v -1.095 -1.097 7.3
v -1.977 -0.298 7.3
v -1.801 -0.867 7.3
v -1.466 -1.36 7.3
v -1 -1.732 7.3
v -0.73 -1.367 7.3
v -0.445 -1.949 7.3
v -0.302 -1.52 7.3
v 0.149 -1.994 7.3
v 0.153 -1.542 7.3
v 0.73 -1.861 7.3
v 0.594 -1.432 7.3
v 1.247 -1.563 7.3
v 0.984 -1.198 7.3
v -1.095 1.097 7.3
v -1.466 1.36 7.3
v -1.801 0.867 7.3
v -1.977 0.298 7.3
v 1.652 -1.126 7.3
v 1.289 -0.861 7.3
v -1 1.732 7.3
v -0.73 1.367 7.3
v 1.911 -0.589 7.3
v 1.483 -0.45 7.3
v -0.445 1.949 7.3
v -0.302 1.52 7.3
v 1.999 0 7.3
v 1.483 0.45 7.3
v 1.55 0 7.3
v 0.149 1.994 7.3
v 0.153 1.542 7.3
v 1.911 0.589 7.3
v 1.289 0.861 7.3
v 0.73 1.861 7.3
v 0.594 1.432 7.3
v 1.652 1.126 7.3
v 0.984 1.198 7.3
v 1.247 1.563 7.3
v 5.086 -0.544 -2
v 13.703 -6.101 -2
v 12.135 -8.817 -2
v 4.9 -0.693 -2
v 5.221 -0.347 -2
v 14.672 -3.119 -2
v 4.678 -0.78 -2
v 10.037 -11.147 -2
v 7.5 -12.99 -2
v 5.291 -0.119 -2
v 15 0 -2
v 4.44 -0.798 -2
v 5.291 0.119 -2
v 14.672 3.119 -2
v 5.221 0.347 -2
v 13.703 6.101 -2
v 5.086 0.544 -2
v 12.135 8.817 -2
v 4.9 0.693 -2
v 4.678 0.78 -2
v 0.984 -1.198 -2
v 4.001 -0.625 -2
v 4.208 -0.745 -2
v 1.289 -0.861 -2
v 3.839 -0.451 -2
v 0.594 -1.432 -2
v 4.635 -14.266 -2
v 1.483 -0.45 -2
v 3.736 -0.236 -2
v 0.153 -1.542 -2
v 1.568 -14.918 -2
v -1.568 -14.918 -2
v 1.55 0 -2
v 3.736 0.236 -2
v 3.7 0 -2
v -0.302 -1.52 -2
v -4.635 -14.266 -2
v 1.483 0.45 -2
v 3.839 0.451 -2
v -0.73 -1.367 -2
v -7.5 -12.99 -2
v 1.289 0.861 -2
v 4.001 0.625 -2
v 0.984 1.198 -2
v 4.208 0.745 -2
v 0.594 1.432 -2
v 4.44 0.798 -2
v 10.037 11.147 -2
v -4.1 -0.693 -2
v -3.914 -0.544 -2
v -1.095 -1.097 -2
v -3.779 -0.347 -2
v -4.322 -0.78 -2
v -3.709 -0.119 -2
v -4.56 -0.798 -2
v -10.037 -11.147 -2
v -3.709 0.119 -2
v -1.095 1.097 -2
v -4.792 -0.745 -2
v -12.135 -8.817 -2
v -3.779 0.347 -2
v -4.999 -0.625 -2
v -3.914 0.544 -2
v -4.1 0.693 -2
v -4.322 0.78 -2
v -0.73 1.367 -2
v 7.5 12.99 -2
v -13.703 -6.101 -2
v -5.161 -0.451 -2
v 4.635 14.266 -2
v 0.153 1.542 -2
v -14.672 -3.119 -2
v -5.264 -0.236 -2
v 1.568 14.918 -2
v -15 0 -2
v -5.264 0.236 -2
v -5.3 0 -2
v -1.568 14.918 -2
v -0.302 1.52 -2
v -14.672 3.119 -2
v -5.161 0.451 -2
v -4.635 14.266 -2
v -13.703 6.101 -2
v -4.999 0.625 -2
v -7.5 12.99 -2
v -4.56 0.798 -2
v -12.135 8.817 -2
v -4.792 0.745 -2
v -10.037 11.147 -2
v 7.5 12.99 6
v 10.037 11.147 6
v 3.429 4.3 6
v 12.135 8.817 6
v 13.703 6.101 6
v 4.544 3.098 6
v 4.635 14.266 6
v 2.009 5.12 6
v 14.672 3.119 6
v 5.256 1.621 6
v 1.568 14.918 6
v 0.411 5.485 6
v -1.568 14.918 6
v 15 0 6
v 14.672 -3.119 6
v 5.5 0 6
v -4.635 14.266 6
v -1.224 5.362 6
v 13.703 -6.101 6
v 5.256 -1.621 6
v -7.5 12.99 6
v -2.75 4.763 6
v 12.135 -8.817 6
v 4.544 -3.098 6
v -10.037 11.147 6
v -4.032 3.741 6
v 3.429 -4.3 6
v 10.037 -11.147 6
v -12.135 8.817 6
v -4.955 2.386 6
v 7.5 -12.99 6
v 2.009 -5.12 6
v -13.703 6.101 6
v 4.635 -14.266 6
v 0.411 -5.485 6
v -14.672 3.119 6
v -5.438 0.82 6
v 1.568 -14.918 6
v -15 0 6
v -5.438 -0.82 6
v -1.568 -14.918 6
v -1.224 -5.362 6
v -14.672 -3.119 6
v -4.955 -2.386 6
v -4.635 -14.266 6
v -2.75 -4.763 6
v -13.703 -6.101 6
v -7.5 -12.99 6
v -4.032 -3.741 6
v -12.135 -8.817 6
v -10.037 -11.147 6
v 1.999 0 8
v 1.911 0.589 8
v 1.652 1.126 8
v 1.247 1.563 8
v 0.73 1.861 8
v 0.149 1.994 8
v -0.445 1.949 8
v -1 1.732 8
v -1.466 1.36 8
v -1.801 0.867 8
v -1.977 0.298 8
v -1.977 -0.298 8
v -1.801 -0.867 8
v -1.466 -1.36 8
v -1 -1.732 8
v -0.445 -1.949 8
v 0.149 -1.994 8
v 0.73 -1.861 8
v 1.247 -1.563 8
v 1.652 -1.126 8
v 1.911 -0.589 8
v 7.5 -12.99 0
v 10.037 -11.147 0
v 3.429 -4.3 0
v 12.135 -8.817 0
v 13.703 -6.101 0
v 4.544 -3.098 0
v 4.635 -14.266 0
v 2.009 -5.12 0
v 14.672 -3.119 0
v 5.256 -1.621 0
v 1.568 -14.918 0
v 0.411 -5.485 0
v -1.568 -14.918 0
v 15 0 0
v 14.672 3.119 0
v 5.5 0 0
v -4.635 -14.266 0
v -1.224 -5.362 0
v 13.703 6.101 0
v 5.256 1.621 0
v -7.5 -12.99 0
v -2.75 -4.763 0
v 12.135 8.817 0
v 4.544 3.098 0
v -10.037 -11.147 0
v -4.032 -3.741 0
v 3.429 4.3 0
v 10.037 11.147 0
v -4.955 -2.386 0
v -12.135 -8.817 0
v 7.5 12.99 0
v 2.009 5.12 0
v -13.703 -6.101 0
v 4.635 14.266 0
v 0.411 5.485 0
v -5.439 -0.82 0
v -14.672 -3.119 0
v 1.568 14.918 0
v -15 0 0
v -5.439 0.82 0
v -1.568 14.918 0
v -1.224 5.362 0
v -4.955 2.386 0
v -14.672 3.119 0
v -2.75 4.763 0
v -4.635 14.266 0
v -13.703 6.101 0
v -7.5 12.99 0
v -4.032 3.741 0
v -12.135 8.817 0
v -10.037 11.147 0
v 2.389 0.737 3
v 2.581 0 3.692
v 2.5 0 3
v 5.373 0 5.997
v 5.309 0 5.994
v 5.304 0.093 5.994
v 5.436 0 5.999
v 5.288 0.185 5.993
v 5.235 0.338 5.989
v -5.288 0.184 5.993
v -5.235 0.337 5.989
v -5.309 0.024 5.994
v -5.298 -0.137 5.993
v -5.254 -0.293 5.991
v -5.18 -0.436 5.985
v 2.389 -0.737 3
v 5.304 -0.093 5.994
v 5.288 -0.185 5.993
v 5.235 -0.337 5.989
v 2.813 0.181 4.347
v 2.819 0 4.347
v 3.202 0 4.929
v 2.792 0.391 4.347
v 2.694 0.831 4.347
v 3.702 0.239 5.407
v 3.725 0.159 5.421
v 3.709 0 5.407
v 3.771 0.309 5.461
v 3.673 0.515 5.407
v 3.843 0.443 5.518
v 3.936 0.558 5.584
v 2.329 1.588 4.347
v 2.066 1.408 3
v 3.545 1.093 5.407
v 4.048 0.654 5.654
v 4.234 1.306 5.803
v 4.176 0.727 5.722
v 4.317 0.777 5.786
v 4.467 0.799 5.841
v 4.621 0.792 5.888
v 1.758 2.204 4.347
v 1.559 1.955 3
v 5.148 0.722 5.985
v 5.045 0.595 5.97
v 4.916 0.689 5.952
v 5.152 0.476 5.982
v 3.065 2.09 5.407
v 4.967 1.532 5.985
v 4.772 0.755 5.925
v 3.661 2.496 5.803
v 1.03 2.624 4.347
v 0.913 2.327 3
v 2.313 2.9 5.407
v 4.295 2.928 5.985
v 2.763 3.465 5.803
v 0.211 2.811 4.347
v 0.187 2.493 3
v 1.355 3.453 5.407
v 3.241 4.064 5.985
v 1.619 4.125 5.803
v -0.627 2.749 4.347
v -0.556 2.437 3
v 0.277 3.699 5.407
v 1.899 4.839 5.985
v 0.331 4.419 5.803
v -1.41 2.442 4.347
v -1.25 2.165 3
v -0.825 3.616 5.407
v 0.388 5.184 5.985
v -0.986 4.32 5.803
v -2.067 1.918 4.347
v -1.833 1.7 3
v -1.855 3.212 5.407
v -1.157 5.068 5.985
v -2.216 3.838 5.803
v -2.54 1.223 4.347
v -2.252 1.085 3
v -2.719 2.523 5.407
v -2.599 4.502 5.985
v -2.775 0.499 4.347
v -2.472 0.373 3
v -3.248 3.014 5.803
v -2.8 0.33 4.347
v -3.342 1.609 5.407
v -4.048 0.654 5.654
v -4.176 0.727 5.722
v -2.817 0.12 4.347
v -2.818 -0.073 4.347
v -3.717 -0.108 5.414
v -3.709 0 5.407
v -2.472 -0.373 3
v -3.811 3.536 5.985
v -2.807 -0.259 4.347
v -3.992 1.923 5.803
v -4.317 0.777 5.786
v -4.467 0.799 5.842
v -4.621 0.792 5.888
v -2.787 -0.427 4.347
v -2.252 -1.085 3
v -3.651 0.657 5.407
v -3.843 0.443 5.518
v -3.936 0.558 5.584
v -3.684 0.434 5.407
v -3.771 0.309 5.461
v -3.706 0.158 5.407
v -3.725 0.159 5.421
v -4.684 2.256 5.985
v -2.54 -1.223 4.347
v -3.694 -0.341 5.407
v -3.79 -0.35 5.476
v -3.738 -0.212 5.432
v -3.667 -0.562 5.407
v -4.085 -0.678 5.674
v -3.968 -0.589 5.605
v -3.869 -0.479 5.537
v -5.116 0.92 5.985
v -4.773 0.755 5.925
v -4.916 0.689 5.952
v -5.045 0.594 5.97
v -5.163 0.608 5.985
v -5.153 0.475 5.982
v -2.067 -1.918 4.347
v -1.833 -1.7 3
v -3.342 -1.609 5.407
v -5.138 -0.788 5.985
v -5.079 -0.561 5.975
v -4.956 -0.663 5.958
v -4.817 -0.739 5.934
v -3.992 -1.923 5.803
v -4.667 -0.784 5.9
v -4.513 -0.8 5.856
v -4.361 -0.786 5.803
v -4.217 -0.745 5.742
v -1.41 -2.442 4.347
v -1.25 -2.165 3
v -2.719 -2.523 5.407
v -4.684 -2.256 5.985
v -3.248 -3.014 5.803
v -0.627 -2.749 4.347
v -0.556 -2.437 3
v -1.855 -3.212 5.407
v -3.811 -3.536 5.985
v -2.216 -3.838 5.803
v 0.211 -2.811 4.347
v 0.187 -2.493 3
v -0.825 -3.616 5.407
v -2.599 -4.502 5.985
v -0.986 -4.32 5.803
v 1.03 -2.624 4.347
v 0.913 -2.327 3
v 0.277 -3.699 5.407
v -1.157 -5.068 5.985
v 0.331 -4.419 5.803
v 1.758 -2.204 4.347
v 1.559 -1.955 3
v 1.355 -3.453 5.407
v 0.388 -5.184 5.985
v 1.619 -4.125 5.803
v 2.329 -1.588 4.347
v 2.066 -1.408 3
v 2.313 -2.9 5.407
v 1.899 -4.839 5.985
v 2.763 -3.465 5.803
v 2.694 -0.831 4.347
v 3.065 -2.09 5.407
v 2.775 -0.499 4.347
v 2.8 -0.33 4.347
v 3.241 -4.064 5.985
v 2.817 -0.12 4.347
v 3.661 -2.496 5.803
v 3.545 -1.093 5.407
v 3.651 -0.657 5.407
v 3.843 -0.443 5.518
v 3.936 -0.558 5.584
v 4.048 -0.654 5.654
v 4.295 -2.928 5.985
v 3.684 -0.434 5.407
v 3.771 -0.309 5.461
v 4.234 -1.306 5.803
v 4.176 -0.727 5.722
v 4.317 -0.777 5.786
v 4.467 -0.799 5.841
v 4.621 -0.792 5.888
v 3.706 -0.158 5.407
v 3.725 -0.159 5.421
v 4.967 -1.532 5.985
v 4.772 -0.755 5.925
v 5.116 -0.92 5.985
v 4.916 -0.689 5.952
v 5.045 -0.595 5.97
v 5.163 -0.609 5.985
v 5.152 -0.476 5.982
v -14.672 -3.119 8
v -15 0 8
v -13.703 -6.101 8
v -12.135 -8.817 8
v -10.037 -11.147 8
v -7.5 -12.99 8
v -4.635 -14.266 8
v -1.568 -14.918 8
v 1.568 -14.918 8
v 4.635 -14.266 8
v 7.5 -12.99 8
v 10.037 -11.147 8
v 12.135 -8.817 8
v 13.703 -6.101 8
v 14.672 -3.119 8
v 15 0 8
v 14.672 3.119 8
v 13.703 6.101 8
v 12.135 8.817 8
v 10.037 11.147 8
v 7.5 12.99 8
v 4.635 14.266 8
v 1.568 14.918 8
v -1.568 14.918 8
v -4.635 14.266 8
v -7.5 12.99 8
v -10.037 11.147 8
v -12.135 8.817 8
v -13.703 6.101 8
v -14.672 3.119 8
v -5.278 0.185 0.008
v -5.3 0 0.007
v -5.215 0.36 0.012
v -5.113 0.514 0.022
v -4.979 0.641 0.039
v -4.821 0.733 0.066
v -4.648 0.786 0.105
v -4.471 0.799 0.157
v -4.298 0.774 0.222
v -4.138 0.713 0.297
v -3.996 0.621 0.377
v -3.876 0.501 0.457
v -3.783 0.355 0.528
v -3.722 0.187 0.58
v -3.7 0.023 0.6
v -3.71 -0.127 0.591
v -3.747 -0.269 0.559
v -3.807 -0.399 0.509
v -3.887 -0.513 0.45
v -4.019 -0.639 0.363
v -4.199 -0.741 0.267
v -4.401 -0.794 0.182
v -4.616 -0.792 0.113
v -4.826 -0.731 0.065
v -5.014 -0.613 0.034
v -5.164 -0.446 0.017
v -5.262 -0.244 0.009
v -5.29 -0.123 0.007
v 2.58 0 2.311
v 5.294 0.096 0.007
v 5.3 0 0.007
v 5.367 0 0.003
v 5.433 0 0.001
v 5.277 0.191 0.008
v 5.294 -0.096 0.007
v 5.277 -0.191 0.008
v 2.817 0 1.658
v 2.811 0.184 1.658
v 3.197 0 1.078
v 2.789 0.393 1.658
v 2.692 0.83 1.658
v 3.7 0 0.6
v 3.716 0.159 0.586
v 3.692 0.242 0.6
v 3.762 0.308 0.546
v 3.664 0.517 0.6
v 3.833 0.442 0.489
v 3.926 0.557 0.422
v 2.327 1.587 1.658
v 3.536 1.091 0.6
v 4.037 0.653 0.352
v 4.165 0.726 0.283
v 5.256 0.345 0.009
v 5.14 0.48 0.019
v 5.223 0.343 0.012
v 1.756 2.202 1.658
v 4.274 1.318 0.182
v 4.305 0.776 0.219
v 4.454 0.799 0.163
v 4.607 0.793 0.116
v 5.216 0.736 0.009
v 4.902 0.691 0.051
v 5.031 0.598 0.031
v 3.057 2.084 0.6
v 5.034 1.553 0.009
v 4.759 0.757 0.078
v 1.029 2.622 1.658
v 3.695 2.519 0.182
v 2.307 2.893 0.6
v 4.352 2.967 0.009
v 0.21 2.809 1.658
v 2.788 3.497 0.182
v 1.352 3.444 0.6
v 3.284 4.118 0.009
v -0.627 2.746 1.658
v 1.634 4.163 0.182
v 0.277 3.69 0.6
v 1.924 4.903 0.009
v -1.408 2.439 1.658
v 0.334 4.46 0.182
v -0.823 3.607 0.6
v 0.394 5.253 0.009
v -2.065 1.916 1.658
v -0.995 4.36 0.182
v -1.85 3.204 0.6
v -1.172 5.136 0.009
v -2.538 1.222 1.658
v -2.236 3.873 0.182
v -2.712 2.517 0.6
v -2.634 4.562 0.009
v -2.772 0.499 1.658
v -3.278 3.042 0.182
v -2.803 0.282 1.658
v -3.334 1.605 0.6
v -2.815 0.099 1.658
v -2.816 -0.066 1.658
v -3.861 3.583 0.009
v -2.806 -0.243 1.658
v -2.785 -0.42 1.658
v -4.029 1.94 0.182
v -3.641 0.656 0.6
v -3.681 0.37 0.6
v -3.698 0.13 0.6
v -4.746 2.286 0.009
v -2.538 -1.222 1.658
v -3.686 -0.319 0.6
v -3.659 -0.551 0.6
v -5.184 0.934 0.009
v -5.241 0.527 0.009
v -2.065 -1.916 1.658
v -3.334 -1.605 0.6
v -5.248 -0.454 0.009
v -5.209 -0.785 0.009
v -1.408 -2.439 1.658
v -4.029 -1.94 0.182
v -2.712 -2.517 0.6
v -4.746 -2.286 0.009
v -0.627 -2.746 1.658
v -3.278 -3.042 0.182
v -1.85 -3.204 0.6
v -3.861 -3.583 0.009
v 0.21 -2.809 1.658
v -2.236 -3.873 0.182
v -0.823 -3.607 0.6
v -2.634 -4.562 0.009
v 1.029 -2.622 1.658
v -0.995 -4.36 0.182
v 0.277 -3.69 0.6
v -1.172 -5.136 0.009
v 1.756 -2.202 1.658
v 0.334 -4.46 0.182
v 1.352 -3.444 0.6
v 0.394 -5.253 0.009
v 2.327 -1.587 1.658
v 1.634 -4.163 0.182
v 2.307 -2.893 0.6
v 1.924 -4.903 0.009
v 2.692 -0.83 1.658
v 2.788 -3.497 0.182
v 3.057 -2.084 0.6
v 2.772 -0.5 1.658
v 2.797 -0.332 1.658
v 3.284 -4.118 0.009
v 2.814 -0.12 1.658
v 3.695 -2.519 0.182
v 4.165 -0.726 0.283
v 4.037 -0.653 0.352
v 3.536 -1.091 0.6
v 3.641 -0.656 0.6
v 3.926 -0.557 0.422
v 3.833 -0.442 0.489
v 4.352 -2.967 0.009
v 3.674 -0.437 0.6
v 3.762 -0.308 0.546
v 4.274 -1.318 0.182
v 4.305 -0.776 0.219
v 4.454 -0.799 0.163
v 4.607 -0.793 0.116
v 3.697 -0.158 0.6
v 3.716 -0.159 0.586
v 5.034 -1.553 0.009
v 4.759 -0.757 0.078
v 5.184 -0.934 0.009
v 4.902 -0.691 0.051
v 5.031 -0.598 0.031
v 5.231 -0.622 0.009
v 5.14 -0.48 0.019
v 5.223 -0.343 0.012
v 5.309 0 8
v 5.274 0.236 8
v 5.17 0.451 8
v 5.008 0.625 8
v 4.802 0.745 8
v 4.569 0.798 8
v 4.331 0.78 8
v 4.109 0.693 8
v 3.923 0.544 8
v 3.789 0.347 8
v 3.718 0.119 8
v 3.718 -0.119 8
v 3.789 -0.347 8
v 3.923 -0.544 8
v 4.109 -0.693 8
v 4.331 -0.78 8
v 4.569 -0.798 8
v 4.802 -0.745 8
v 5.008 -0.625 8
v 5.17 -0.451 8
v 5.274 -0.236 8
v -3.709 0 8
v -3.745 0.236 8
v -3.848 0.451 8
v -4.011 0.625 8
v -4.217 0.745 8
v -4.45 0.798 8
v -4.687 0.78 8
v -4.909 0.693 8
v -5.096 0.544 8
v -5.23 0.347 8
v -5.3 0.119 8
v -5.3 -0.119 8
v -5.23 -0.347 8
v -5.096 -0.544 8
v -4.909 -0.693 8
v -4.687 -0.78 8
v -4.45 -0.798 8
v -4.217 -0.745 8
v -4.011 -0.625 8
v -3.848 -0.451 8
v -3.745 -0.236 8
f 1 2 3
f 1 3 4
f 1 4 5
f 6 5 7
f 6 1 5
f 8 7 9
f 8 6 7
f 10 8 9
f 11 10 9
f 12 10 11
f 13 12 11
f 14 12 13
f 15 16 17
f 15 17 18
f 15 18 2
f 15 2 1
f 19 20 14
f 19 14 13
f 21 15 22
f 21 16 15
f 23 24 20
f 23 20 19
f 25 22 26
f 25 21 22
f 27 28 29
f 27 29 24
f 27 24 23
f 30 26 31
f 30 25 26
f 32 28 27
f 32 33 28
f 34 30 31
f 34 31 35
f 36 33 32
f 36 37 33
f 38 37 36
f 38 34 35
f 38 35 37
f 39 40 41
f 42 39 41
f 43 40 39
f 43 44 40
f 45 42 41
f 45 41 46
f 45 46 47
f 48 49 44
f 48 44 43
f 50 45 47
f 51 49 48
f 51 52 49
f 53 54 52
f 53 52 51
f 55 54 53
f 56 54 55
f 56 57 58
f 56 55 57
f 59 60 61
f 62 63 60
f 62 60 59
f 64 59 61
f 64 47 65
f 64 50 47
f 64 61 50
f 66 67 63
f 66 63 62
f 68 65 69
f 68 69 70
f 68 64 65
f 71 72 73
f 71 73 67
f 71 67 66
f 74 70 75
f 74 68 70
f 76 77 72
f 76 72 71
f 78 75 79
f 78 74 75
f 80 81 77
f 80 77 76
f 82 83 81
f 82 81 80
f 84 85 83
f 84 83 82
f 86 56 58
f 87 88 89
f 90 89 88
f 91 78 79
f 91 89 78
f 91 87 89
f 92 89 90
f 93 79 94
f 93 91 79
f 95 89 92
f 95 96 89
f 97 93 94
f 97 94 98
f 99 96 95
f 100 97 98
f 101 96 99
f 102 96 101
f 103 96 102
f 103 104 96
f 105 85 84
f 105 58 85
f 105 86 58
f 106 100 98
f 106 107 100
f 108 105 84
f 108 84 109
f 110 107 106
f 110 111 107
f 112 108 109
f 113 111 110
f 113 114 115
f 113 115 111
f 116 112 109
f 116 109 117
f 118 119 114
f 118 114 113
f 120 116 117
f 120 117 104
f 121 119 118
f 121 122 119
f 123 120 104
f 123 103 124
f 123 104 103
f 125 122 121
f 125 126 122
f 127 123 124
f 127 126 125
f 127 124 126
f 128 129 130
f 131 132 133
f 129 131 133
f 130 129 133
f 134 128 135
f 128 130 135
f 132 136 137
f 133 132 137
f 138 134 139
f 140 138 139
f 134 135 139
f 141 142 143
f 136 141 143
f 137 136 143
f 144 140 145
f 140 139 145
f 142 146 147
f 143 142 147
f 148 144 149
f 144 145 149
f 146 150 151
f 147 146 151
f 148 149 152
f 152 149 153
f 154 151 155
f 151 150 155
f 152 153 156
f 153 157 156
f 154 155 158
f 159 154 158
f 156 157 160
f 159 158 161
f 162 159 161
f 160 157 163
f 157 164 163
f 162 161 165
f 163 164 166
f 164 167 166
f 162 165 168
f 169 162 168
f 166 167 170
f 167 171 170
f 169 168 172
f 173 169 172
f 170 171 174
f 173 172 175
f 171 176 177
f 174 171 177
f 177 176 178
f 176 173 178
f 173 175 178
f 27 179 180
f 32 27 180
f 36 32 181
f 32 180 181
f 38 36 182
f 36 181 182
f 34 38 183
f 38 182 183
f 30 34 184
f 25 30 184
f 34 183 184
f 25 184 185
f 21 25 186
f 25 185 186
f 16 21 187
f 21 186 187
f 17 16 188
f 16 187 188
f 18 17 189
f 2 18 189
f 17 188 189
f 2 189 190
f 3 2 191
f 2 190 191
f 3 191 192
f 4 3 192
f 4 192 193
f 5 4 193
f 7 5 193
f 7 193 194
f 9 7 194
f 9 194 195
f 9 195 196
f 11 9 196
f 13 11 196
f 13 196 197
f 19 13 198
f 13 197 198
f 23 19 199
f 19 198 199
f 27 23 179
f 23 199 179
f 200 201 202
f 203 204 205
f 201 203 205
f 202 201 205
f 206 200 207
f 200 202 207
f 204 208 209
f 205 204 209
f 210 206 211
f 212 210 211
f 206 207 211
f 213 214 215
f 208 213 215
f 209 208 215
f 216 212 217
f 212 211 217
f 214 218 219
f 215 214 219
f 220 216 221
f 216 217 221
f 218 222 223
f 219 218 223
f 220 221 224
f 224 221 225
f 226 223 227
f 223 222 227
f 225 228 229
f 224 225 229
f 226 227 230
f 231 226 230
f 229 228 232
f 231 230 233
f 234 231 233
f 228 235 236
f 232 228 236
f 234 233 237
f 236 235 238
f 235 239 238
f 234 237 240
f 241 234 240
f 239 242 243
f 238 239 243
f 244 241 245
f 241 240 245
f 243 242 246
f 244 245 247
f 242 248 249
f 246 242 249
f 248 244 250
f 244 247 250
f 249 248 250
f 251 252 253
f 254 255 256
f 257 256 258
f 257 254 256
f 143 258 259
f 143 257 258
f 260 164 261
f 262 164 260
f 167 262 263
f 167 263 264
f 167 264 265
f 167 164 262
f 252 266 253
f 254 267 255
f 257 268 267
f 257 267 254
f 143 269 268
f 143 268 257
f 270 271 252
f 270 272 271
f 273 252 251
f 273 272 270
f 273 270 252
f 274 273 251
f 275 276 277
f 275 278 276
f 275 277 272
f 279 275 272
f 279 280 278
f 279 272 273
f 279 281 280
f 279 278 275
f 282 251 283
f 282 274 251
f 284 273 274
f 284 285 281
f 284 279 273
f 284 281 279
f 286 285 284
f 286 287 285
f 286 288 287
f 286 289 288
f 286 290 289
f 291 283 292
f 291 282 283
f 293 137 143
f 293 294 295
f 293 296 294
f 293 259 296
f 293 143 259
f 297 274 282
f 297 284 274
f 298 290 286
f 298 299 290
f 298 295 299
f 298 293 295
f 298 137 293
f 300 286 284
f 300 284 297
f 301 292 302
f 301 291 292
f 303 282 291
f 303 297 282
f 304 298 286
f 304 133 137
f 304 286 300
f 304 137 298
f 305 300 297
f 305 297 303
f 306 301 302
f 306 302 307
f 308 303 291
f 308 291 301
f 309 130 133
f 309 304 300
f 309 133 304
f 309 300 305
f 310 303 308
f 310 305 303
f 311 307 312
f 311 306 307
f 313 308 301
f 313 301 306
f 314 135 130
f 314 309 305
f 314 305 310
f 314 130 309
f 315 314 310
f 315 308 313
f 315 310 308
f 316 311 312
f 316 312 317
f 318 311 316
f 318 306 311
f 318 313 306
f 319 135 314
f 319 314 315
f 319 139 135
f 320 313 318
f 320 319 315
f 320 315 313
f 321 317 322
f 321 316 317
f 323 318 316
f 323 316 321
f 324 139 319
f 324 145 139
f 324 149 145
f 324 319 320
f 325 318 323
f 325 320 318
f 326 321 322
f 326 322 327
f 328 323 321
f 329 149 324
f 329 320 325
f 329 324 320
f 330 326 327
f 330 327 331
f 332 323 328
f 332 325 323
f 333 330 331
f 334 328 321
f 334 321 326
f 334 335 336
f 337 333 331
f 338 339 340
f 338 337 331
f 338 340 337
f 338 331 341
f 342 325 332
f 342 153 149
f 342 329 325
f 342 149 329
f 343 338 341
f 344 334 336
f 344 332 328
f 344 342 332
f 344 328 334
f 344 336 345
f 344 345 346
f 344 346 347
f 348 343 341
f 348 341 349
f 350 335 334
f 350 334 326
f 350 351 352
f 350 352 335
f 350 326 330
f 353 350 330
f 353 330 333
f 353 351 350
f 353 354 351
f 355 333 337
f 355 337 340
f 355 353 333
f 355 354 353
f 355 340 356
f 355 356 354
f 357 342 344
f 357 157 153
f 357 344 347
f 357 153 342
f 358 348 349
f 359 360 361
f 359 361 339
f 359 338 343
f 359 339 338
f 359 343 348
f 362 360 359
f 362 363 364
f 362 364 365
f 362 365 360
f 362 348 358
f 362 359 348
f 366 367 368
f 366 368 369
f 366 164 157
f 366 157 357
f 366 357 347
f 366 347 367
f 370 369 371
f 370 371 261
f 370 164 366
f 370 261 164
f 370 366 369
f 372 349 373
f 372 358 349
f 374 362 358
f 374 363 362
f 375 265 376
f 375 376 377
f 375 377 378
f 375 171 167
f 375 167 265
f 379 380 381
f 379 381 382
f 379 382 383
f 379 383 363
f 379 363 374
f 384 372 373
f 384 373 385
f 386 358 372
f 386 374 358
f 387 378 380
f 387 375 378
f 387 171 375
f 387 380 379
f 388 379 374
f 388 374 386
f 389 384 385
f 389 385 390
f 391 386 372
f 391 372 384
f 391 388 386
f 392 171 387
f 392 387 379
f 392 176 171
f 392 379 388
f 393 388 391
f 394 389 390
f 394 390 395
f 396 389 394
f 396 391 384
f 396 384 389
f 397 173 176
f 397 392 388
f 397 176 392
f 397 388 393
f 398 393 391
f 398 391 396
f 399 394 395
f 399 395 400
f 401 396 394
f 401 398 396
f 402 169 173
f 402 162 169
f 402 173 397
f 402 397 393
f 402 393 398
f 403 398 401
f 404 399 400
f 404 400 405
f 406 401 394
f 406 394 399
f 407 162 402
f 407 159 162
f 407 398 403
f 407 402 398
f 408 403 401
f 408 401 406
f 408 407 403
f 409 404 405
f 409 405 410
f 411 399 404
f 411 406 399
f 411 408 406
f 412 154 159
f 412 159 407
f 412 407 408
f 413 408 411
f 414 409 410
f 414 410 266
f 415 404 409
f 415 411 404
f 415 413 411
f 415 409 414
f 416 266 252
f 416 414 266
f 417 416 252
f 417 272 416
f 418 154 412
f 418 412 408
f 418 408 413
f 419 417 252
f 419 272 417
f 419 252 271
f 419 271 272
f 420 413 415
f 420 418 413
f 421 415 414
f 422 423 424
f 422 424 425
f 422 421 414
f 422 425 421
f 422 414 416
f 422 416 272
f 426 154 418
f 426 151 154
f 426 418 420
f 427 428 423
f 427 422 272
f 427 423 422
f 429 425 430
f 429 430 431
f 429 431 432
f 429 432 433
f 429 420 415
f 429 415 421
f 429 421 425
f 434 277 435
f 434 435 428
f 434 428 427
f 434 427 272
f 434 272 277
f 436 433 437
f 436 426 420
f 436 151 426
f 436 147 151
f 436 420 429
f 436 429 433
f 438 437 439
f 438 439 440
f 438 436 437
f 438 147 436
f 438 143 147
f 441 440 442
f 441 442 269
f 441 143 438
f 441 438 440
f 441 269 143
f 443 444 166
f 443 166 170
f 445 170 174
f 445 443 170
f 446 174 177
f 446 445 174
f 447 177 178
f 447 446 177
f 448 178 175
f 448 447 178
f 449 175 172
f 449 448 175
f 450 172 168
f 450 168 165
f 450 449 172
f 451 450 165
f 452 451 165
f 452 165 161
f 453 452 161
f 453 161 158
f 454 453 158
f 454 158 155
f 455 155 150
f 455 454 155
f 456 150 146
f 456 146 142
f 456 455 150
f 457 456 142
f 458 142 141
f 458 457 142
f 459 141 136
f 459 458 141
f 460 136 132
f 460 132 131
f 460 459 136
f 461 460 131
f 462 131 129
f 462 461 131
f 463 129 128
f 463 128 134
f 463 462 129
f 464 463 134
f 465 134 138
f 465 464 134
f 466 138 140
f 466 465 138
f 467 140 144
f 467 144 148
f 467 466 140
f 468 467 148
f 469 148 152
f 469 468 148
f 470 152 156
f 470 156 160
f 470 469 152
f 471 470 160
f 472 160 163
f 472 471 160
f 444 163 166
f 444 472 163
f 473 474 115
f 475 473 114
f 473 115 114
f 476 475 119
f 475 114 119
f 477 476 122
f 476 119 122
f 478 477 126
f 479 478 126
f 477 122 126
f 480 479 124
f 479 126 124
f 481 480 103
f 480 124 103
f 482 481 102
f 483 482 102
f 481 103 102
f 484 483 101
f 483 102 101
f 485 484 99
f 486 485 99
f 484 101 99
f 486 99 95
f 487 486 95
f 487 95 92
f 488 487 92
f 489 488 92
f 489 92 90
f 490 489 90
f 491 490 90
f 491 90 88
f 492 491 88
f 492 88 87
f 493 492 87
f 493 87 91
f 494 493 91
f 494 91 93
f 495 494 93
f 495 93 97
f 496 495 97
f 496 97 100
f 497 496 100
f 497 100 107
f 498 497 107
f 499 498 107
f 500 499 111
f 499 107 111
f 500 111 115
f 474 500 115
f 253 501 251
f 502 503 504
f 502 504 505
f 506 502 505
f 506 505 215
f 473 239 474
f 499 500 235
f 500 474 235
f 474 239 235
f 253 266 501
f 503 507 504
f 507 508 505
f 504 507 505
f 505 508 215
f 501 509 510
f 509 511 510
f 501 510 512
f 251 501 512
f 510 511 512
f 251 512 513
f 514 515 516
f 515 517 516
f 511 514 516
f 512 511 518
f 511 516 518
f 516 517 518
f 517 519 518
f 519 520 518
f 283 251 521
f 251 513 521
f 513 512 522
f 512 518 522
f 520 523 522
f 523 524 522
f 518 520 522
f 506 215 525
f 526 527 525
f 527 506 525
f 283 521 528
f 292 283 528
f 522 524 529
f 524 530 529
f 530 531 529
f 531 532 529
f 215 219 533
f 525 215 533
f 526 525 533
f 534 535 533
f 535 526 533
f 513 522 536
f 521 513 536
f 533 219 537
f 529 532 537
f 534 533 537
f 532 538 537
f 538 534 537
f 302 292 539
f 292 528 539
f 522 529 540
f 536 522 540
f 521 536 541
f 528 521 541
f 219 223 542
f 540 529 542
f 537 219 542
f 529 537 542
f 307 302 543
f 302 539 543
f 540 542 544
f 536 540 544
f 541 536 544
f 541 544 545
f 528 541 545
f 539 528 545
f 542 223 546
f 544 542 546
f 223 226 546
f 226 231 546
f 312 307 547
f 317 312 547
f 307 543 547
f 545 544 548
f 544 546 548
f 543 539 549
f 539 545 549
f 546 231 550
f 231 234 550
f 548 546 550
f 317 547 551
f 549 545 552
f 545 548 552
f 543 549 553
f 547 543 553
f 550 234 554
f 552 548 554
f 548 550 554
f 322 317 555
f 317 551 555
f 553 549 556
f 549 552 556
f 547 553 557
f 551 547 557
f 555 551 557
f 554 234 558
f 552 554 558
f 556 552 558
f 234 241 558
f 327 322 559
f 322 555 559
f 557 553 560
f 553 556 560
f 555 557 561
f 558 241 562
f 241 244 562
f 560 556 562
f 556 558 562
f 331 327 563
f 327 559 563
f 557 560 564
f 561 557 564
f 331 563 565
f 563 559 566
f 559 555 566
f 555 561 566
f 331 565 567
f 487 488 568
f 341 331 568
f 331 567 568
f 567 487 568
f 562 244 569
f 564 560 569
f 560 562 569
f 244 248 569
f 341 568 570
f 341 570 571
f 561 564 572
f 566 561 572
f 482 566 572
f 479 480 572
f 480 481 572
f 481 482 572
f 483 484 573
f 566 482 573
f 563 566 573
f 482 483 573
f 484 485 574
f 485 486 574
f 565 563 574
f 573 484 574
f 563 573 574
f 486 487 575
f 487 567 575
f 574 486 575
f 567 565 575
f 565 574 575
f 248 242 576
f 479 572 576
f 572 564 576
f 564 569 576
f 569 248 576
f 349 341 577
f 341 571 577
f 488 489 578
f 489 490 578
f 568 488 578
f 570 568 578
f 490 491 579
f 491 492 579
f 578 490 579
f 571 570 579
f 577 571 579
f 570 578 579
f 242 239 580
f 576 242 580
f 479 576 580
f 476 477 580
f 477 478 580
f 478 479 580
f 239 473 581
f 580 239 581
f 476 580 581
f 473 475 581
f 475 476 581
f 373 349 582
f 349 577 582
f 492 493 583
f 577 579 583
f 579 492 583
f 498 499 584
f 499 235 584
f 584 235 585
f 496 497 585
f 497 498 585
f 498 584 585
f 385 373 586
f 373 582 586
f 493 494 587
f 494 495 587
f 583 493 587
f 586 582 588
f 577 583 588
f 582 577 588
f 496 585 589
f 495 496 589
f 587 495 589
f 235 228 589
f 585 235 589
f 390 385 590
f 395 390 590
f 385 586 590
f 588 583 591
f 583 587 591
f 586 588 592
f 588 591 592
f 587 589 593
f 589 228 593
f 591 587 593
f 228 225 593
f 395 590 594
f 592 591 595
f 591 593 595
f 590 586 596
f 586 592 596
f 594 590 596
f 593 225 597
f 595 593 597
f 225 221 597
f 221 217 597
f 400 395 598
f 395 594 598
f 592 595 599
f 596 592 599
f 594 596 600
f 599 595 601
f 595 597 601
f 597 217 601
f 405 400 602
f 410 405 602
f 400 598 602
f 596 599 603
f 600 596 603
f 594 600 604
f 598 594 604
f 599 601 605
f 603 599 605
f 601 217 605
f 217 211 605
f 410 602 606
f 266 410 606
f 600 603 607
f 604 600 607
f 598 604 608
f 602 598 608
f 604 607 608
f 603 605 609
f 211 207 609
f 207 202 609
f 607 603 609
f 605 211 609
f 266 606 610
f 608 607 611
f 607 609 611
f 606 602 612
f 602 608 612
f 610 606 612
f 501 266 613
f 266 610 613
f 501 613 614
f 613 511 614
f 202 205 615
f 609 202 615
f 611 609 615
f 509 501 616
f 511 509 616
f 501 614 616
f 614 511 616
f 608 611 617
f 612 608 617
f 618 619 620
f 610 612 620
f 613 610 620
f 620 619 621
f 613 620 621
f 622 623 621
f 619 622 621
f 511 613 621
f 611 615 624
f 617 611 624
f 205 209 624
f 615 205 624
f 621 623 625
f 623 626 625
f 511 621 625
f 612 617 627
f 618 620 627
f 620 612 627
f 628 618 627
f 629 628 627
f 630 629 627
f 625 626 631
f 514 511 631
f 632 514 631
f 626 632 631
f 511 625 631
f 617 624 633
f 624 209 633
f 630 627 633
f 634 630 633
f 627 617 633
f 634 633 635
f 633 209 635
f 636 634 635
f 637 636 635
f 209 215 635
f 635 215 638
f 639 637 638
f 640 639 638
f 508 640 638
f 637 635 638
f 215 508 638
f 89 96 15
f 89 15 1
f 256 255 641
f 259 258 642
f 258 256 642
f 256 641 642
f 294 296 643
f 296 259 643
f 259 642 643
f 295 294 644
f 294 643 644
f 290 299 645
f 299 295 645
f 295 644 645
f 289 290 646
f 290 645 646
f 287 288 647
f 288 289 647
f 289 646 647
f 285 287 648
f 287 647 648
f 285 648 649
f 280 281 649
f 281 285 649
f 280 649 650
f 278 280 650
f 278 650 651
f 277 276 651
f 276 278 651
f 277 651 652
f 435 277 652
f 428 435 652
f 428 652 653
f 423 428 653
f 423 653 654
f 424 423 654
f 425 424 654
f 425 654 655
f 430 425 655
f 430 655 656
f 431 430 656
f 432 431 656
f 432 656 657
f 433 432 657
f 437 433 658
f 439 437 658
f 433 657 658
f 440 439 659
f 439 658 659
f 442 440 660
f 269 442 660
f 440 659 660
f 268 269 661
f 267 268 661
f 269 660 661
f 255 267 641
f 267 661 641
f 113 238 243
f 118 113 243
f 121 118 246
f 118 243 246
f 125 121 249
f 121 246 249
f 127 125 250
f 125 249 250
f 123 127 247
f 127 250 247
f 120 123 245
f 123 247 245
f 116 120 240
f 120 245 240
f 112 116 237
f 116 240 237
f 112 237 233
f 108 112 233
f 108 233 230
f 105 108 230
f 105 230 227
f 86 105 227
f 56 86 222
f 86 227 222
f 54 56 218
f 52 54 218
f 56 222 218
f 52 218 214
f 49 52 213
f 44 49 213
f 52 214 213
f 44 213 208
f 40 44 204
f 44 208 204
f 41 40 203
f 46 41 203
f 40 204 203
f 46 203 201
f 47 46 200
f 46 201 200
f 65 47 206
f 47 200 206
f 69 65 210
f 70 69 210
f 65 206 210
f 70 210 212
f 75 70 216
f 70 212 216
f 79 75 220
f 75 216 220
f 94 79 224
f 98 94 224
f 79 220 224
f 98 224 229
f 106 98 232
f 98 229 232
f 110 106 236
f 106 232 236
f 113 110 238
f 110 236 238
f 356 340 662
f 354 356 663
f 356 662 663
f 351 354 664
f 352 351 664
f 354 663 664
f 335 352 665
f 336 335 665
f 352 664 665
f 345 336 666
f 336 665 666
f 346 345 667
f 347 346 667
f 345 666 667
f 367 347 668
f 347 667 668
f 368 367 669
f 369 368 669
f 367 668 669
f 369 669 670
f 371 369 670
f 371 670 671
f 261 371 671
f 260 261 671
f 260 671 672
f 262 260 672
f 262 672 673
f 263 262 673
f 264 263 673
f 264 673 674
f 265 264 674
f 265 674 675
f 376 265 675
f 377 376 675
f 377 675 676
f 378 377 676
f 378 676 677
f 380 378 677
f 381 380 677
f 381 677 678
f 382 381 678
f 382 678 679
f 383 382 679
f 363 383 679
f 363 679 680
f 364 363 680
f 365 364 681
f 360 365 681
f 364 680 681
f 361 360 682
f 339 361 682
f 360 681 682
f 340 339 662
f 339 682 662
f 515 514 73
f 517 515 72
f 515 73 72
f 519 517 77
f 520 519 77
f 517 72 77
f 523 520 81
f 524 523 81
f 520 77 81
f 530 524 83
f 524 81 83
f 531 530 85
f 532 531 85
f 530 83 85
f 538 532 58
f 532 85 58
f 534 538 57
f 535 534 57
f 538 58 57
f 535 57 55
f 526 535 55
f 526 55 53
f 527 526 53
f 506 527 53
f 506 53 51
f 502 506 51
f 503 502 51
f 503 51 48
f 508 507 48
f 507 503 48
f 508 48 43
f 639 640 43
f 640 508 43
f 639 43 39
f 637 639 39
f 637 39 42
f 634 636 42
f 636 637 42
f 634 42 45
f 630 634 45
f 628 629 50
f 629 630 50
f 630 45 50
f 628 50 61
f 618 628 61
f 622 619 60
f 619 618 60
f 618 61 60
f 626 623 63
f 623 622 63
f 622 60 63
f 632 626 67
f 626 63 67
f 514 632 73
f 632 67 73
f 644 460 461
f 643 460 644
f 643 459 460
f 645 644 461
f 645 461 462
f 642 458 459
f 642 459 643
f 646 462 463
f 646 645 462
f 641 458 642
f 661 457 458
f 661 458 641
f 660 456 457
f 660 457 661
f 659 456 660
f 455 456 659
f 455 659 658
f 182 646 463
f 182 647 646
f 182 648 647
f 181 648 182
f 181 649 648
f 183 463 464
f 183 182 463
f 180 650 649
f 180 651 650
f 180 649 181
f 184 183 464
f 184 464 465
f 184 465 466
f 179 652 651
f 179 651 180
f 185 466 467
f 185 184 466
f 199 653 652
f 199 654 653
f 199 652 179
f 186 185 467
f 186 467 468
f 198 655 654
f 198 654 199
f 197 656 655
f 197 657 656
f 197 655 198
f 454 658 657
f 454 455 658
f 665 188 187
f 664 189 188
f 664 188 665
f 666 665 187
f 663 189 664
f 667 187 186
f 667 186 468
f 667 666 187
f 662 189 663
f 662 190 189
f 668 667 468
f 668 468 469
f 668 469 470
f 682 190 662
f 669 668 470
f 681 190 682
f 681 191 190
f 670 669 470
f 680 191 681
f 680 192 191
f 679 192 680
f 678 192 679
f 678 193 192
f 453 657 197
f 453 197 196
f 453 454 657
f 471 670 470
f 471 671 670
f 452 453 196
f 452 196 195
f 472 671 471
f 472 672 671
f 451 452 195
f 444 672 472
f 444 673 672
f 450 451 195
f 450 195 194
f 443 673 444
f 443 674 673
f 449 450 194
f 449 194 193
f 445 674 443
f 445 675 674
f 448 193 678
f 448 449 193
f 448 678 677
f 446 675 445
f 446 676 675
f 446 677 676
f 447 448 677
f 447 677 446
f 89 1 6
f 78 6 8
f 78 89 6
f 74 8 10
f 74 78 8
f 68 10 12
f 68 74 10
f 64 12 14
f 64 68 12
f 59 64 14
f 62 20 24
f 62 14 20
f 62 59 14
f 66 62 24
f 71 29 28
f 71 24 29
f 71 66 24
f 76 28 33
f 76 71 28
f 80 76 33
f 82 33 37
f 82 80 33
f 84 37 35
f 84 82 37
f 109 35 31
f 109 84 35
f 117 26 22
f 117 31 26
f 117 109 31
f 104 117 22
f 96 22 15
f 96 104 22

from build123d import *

# Parameters (mm, degrees)
SKETCH1_R           = 2.5
BOSS_EXTRUDE1_DEPTH = 6
SKETCH2_R           = 15
BOSS_EXTRUDE2_DEPTH = 2
BOSS_EXTRUDE3_START = 2
SKETCH3_R           = 15
BOSS_EXTRUDE3_DEPTH = 2
FILLET9_R           = 3
FILLET10_R          = 3
CUT_EXTRUDE1_DEPTH  = 10
SKETCH5_R           = 1.999371682
CUT_EXTRUDE2_DEPTH  = 0.7
SKETCH7_R           = 0.8
CUT_EXTRUDE6_DEPTH  = 3
SKETCH8_R           = 0.8
CUT_EXTRUDE7_DEPTH  = 5


with BuildPart() as part:
    # Sketch1 → Boss-Extrude1 (new body)
    with BuildSketch(Plane.XY):
        Circle(SKETCH1_R)
    extrude(amount=BOSS_EXTRUDE1_DEPTH)

    # Sketch2 → Boss-Extrude2 (add)
    with BuildSketch(Plane(origin=(0, 0, 0), x_dir=(-1, 0, 0), z_dir=(0, 0, -1))):
        Circle(SKETCH2_R)
    extrude(amount=BOSS_EXTRUDE2_DEPTH)

    # Sketch3 → Boss-Extrude3 (add)
    with BuildSketch(Plane.XY.offset(6).offset(BOSS_EXTRUDE3_START)):
        with Locations(Location((0, 0, 0), (0, 0, 180))):
            Circle(SKETCH3_R)
    extrude(amount=-BOSS_EXTRUDE3_DEPTH)

    # Fillet9
    fillet9_edges = [part.edges().sort_by_distance(p)[0] for p in [
        (-2.5, 0, 0),
    ]]
    fillet(fillet9_edges, radius=FILLET9_R)

    # Fillet10
    fillet10_edges = [part.edges().sort_by_distance(p)[0] for p in [
        (-2.5, 0, 6),
    ]]
    fillet(fillet10_edges, radius=FILLET10_R - 0.0001)  # a hair under: the kernel refuses the full size

    # Sketch4 → Cut-Extrude1 (cut)
    with BuildSketch(Plane(origin=(0, 0, -2), x_dir=(-1, 0, 0), z_dir=(0, 0, -1))):
        with BuildLine():
            Line((1.095333333, 1.096697264), (1.095333333, -1.096697264))
            ThreePointArc((1.095333333, -1.096697264), (-1.55, 0), (1.095333333, 1.096697264))
        make_face()
    extrude(amount=-CUT_EXTRUDE1_DEPTH, mode=Mode.SUBTRACT)

    # Sketch5 → Cut-Extrude2 (cut)
    with BuildSketch(Plane.XY.offset(8)):
        Circle(SKETCH5_R)
    extrude(amount=-CUT_EXTRUDE2_DEPTH, mode=Mode.SUBTRACT)

    # Sketch7 → Cut-Extrude6 (cut)
    with BuildSketch(Plane.XY.offset(8)):
        with Locations((4.509371682, 0)):
            Circle(SKETCH7_R)
        with Locations((-4.509371682, 0)):
            Circle(SKETCH7_R)
    extrude(amount=-CUT_EXTRUDE6_DEPTH, mode=Mode.SUBTRACT)

    # Sketch8 → Cut-Extrude7 (cut)
    with BuildSketch(Plane(origin=(0, 0, -2), x_dir=(-1, 0, 0), z_dir=(0, 0, -1))):
        with Locations((-4.5, 0)):
            Circle(SKETCH8_R)
        with Locations((4.5, 0)):
            Circle(SKETCH8_R)
    extrude(amount=-CUT_EXTRUDE7_DEPTH, mode=Mode.SUBTRACT)


solid = part.part
